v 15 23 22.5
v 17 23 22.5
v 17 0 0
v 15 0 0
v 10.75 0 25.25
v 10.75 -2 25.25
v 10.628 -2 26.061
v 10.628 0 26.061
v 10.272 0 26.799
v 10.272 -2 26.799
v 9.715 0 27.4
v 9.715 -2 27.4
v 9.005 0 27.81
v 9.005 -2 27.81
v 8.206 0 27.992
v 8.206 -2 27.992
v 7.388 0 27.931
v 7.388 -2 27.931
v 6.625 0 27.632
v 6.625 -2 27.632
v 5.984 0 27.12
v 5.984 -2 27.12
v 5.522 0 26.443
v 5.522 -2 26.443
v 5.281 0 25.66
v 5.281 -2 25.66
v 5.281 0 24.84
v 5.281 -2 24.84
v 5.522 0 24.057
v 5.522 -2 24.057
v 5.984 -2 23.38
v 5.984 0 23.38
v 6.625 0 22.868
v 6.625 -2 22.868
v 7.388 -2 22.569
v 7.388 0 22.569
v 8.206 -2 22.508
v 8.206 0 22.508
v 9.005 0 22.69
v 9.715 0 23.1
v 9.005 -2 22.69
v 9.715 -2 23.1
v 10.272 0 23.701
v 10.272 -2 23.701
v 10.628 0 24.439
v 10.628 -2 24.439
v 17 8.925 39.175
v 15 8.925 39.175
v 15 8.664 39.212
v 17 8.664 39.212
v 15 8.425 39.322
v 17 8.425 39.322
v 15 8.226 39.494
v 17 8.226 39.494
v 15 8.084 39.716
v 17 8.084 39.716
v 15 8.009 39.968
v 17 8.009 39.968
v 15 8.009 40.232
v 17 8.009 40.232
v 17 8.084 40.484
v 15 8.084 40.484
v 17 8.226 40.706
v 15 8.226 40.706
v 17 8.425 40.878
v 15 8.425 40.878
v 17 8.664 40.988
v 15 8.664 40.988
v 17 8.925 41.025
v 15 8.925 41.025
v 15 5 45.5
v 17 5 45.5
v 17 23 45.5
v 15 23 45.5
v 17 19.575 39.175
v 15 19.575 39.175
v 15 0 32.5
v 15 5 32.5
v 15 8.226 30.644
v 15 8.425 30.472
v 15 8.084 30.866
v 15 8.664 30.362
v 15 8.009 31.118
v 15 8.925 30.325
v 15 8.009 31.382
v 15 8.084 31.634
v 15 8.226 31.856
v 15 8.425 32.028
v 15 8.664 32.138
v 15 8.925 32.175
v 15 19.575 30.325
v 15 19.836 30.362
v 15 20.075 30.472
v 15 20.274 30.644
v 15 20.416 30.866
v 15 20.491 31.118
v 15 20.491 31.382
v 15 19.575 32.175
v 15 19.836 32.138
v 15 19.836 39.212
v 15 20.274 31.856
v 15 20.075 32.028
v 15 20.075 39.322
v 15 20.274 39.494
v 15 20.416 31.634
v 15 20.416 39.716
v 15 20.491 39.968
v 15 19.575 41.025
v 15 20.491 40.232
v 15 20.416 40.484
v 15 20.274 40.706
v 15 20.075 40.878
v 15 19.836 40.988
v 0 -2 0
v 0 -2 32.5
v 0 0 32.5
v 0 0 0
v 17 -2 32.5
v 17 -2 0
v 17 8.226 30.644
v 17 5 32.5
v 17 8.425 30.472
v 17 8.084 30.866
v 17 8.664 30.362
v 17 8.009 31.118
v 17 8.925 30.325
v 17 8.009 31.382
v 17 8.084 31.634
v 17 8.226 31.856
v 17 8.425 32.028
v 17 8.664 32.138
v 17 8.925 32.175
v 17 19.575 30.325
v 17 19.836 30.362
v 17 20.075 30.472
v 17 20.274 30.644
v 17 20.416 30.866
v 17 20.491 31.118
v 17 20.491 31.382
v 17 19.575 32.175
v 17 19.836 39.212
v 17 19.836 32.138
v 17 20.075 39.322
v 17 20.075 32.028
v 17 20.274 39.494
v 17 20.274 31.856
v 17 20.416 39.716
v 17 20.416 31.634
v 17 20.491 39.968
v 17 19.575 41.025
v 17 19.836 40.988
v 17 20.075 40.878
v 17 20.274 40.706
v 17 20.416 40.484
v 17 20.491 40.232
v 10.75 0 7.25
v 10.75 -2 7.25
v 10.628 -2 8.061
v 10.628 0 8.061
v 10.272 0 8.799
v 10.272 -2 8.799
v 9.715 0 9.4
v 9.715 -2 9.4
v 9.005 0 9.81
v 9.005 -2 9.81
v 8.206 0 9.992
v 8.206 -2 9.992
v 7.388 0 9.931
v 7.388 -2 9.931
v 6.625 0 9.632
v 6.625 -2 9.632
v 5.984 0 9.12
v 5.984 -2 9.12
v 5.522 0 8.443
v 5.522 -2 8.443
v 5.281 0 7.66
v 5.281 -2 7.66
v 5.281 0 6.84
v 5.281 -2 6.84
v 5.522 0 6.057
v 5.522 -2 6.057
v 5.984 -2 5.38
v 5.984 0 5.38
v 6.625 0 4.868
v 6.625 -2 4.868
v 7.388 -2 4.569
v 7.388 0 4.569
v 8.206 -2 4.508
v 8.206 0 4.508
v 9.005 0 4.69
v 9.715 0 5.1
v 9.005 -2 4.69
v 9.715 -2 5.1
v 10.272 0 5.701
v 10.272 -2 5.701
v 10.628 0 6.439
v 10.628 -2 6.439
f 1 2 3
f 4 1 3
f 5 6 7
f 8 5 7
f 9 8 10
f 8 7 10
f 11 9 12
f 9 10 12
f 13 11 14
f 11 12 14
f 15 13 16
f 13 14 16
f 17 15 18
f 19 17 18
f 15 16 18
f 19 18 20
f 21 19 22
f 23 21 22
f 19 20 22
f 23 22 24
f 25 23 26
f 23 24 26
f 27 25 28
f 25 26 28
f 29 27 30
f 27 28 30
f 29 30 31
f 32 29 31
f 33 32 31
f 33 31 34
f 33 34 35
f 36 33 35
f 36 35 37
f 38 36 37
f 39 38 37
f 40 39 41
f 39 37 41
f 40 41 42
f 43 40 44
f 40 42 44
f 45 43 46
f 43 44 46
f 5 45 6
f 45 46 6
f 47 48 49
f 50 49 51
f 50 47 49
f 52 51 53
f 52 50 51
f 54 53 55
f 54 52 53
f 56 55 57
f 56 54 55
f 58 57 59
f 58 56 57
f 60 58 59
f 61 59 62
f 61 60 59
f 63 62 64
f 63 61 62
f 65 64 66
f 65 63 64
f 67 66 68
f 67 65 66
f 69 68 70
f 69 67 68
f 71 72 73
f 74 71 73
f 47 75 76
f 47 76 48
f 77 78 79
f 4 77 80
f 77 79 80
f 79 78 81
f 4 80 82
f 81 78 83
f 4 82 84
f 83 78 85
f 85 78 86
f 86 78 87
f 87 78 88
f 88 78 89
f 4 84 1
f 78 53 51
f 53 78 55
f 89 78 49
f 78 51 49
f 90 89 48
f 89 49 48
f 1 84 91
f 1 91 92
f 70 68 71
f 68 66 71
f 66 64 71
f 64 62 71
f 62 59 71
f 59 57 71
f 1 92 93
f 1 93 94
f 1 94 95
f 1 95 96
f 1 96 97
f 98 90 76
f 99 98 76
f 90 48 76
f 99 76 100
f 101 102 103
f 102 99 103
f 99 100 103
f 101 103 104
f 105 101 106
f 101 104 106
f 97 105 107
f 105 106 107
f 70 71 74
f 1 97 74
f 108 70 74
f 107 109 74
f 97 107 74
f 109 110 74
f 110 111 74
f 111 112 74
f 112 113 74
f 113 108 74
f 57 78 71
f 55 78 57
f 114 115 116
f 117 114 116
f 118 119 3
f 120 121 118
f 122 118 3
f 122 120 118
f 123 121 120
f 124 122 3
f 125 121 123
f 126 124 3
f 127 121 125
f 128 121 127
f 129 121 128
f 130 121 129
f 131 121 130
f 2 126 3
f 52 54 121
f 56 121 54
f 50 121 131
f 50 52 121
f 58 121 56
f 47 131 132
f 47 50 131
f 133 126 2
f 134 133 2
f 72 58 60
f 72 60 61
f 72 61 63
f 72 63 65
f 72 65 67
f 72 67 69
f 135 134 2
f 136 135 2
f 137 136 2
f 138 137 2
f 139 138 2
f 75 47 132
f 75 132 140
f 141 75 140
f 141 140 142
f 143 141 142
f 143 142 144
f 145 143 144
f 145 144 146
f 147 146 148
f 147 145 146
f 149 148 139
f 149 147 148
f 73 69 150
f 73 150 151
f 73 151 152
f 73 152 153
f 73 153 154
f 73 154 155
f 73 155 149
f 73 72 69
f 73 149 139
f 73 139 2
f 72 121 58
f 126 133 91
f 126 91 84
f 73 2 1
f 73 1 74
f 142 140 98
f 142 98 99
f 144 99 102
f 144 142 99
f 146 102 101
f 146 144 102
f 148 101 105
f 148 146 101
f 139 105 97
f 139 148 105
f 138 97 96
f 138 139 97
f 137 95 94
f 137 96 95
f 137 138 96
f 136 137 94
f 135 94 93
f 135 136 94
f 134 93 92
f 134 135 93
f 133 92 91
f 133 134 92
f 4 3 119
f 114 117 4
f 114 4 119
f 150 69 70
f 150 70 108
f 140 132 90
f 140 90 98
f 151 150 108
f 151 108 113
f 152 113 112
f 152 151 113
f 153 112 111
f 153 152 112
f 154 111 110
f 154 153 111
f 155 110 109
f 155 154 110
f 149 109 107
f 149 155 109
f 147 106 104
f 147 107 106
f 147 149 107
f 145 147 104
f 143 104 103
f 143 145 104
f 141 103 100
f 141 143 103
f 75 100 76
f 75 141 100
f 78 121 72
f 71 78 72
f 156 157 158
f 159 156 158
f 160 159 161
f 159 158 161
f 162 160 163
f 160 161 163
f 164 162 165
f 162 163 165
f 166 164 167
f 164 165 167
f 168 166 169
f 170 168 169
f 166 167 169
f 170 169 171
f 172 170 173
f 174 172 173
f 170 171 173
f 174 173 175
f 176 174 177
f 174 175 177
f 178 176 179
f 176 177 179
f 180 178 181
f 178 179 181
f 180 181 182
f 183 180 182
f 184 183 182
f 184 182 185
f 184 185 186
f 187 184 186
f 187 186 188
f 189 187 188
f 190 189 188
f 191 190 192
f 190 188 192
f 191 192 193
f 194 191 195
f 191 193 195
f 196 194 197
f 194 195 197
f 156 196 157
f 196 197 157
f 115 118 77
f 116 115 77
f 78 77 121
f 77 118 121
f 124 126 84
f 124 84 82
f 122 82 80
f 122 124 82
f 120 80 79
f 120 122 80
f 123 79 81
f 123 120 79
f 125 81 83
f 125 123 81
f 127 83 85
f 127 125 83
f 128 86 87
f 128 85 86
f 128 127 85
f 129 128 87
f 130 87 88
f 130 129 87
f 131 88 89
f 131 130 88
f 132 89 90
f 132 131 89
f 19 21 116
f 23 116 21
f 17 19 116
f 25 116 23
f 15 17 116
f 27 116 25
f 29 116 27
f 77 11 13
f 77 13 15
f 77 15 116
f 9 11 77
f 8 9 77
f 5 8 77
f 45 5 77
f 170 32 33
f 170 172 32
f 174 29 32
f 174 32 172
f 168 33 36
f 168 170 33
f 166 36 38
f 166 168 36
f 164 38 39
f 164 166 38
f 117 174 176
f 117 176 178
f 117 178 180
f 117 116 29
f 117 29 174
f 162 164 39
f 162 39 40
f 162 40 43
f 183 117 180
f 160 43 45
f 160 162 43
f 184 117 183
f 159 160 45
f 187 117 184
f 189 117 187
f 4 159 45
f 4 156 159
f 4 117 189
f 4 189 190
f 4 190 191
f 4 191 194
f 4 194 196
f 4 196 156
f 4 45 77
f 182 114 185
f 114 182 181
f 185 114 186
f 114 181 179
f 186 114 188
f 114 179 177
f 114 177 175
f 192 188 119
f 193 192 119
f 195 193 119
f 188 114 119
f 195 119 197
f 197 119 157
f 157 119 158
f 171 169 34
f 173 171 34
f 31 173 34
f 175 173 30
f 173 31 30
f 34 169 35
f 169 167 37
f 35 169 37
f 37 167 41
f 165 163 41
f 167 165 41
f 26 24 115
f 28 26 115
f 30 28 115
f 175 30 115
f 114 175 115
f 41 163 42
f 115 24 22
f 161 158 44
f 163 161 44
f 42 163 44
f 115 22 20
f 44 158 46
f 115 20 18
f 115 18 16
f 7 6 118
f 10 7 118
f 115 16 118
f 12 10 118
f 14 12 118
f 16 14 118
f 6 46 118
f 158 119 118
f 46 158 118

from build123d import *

# Parameters (mm, degrees)
BOSS_EXTRUDE1_DEPTH = 32.5
SKETCH2_R           = 2.75
CUT_EXTRUDE1_DEPTH  = 2
CUT_EXTRUDE2_DEPTH  = 2
SKETCH4_W           = 25
SKETCH4_H           = 13
BOSS_EXTRUDE2_DEPTH = 2
CUT_EXTRUDE3_REACH  = 55.742
CUT_EXTRUDE4_REACH  = 55.742
SKETCH7_W           = 7
SKETCH7_H           = 13


with BuildPart() as part:
    # Sketch1 → Boss-Extrude1 (new body)
    with BuildSketch(Plane(origin=(0, 0, 0), x_dir=(0, 1, 0), z_dir=(0, 0, 1))):
        Polygon((0, 0), (0, -15), (23, -15), (23, -17), (-2, -17), (-2, 0), align=None)
    extrude(amount=BOSS_EXTRUDE1_DEPTH)

    # Sketch2 → Cut-Extrude1 (cut)
    with BuildSketch(Plane.XZ.offset(2)):
        with Locations((8, 25.25)):
            Circle(SKETCH2_R)
        with Locations((8, 7.25)):
            Circle(SKETCH2_R)
    extrude(amount=-CUT_EXTRUDE1_DEPTH, mode=Mode.SUBTRACT)

    # Sketch3 → Cut-Extrude2 (cut)
    with BuildSketch(Plane.YZ.offset(17)):
        Polygon((23, 22.5), (0, 0), (23, 0), align=None)
    extrude(amount=-CUT_EXTRUDE2_DEPTH, mode=Mode.SUBTRACT)

    # Sketch4 → Boss-Extrude2 (add)
    with BuildSketch(Plane.YZ.offset(17)):
        with Locations((10.5, 39)):
            Rectangle(SKETCH4_W, SKETCH4_H)
    extrude(amount=-BOSS_EXTRUDE2_DEPTH)

    # Sketch5 → Cut-Extrude3 (cut, up to next)
    with BuildSketch(Plane.YZ.offset(17), mode=Mode.PRIVATE) as cut_extrude3_sk1:
        with BuildLine():
            Line((8.925, 41.025), (19.575, 41.025))
            ThreePointArc((19.575, 41.025), (20.5, 40.1), (19.575, 39.175))
            Line((19.575, 39.175), (8.925, 39.175))
            ThreePointArc((8.925, 39.175), (8, 40.1), (8.925, 41.025))
        make_face()
    cut_extrude3_tool1 = extrude(cut_extrude3_sk1.sketch, amount=-CUT_EXTRUDE3_REACH, mode=Mode.PRIVATE) & part.part
    # Sketch5 → Cut-Extrude3 (cut, up to next)
    with BuildSketch(Plane.YZ.offset(17), mode=Mode.PRIVATE) as cut_extrude3_sk2:
        with BuildLine():
            Line((8.925, 32.175), (19.575, 32.175))
            ThreePointArc((19.575, 32.175), (20.5, 31.25), (19.575, 30.325))
            Line((19.575, 30.325), (8.925, 30.325))
            ThreePointArc((8.925, 30.325), (8, 31.25), (8.925, 32.175))
        make_face()
    cut_extrude3_tool2 = extrude(cut_extrude3_sk2.sketch, amount=-CUT_EXTRUDE3_REACH, mode=Mode.PRIVATE) & part.part
    add(cut_extrude3_tool1.solids().sort_by_distance((17, 14.25, 40.1))[0], mode=Mode.SUBTRACT)
    add(cut_extrude3_tool2.solids().sort_by_distance((17, 14.25, 31.25))[0], mode=Mode.SUBTRACT)

    # Sketch7 → Cut-Extrude4 (cut, up to next)
    with BuildSketch(Plane.YZ.offset(17), mode=Mode.PRIVATE) as cut_extrude4_sk1:
        with Locations((1.5, 39)):
            Rectangle(SKETCH7_W, SKETCH7_H)
    cut_extrude4_tool1 = extrude(cut_extrude4_sk1.sketch, amount=-CUT_EXTRUDE4_REACH, mode=Mode.PRIVATE) & part.part
    add(cut_extrude4_tool1.solids().sort_by_distance((17, 1.5, 39))[0], mode=Mode.SUBTRACT)


solid = part.part
